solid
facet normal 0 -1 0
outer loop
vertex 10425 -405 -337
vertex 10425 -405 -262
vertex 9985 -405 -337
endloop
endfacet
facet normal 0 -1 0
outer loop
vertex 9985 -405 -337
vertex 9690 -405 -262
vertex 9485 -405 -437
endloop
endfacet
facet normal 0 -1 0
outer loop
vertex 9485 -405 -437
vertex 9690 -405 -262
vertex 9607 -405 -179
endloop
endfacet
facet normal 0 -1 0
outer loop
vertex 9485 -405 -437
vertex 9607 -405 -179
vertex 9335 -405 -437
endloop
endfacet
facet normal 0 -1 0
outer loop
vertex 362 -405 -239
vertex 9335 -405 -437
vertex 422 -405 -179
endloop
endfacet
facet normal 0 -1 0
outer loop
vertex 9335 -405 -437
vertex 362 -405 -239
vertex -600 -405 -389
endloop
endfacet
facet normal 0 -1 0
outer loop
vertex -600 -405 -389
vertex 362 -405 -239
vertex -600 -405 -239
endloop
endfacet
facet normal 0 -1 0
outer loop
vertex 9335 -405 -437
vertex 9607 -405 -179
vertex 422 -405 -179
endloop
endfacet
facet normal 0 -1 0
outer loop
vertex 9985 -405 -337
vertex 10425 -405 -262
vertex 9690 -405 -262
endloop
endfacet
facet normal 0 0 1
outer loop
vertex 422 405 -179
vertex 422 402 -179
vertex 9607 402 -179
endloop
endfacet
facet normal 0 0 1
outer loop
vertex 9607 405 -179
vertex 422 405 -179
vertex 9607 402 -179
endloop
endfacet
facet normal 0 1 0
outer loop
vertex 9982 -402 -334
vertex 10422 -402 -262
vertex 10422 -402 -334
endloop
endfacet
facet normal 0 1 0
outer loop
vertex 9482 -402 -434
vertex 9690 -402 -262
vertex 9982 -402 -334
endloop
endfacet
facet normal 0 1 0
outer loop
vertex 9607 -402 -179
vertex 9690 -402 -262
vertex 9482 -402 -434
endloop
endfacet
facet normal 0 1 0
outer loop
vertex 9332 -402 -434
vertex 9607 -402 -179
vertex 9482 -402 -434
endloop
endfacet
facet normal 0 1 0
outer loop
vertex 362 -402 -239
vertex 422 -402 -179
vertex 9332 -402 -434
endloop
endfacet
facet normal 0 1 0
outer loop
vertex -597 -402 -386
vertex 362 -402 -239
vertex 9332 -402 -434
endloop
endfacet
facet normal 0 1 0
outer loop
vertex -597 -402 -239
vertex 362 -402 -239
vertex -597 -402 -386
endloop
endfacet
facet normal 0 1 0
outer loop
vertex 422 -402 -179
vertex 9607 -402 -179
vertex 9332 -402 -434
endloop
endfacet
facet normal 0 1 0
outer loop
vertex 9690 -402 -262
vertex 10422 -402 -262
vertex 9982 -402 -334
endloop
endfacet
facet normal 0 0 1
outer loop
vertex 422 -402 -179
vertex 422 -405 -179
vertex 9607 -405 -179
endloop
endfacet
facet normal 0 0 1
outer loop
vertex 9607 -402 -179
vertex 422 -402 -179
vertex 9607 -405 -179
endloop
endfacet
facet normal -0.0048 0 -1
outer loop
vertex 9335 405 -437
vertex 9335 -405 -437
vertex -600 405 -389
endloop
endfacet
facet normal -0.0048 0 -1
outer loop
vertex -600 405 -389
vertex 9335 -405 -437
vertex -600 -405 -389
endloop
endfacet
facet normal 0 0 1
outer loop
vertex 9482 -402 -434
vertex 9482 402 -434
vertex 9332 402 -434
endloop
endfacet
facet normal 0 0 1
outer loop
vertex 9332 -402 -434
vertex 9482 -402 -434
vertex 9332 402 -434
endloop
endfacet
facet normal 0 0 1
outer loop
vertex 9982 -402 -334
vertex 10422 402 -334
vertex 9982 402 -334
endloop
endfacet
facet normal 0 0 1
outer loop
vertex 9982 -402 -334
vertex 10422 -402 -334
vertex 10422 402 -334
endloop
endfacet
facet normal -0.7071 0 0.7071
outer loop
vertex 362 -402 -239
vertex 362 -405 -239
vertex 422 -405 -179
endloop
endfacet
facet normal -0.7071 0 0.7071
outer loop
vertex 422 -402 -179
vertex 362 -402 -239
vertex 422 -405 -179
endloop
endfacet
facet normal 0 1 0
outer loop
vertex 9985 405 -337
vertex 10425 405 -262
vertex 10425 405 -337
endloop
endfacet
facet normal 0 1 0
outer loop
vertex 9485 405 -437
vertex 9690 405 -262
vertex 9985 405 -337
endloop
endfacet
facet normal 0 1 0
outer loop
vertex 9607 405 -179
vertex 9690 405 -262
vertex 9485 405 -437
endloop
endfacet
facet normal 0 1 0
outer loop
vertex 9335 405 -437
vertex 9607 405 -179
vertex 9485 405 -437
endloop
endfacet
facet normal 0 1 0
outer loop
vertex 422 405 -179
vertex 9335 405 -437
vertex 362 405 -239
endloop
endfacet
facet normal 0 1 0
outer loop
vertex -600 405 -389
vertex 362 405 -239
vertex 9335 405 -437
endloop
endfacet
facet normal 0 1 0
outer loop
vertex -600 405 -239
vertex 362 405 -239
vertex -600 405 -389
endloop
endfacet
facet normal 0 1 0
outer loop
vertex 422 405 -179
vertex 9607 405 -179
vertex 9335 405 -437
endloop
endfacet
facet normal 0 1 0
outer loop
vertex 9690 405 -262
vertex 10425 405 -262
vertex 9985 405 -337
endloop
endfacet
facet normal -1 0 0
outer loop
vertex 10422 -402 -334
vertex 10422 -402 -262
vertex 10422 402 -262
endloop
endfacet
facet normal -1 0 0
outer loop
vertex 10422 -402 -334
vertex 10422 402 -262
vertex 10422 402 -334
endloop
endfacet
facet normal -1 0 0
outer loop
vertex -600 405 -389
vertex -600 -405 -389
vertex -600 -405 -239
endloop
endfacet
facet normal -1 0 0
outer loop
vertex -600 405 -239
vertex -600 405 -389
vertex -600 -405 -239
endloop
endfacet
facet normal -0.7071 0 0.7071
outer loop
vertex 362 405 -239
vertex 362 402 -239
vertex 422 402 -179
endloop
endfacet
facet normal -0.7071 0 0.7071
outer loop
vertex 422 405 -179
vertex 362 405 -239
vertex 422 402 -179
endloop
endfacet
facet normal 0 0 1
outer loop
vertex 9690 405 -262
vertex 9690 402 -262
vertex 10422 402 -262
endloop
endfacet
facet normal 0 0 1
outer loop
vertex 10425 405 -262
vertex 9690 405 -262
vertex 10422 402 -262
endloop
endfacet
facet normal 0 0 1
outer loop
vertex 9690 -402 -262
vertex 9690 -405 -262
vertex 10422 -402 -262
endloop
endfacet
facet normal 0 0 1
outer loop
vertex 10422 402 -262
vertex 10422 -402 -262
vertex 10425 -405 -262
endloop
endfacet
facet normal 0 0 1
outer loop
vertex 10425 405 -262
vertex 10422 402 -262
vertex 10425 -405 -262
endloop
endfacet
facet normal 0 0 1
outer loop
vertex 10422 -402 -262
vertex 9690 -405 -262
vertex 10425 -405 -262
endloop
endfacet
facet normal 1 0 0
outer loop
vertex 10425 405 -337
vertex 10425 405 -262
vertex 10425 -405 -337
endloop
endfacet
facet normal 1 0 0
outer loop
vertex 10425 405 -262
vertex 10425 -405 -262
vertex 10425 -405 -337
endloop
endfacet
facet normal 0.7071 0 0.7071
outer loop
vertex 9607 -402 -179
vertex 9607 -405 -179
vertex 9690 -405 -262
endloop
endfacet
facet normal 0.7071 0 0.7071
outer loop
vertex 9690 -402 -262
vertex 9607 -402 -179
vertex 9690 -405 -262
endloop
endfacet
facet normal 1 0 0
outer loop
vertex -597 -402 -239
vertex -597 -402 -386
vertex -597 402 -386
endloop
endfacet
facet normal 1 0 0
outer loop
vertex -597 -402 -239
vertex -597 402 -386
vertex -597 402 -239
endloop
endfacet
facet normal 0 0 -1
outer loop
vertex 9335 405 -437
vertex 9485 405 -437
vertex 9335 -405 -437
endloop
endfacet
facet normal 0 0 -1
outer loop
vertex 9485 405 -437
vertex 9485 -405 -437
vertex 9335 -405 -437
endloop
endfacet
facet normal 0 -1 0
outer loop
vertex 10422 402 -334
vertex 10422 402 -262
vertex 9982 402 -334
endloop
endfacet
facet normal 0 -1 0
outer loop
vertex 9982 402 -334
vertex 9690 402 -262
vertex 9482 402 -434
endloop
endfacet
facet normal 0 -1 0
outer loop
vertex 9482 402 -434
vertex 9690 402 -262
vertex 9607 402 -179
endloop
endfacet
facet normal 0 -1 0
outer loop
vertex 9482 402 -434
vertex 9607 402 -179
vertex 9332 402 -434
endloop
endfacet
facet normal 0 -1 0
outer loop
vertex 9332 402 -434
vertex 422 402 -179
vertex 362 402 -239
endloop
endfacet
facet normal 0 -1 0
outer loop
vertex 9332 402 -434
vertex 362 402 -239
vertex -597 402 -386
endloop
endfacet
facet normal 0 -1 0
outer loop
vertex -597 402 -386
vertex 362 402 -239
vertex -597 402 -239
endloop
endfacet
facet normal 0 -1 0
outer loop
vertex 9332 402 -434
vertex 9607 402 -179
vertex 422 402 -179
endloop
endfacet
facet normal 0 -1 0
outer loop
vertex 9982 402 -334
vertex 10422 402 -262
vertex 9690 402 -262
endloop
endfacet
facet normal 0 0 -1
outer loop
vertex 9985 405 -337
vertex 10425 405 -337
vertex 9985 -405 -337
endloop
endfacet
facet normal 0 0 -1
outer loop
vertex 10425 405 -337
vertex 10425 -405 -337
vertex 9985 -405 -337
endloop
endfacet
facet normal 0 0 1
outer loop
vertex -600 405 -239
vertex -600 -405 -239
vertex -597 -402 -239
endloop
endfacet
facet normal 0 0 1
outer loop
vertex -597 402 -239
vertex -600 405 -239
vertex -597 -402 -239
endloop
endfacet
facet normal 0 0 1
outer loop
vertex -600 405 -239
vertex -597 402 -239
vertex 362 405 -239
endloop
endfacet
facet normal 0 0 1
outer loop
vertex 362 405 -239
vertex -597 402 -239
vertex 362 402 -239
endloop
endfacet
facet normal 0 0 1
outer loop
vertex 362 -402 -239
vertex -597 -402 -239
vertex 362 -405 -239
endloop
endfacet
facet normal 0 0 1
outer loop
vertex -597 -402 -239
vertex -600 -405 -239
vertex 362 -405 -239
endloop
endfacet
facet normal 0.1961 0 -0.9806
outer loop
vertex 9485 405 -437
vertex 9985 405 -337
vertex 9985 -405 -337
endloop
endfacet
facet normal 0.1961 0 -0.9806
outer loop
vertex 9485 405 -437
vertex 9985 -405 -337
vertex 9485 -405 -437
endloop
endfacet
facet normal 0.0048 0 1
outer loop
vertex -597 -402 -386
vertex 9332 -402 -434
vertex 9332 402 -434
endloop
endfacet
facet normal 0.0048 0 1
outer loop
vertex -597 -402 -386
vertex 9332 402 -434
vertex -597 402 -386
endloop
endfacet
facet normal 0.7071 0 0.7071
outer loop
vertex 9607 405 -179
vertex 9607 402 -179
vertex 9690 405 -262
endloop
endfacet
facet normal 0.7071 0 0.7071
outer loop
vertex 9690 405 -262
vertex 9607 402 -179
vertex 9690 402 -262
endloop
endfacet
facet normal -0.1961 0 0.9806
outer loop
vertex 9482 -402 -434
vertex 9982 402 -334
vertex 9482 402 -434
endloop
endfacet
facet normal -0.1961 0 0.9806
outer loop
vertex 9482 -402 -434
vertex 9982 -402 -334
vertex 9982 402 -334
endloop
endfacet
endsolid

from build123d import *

# Parameters (mm, degrees)
EXTRUDE032_DEPTH = 402
EXTRUDE015_DEPTH = 405


with BuildPart() as extrude032:
    # Sketch033 → Extrude032 (new body, symmetric)
    with BuildSketch(Plane.XZ):
        Polygon((-597, -239), (362, -239), (422, -179), (9604, -179), (9687, -262), (10422, -262), (10422, -337), (9982, -337), (9482, -437), (9332, -437), (-597, -389), align=None)
    extrude(amount=EXTRUDE032_DEPTH, both=True)


with BuildPart() as extrude032_1:
    # Extrude032 placement: moved
    add(extrude032.part.moved(Location((0, 0, 3))))


with BuildPart() as cut:
    # Sketch023 → Extrude015 (new body, symmetric)
    with BuildSketch(Plane.XZ):
        Polygon((-600, -239), (362, -239), (422, -179), (9607, -179), (9690, -262), (10425, -262), (10425, -337), (9985, -337), (9485, -437), (9335, -437), (-600, -389), align=None)
    extrude(amount=EXTRUDE015_DEPTH, both=True)

    # Cut: cut Extrude032
    add(extrude032_1.part, mode=Mode.SUBTRACT)


solid = cut.part
